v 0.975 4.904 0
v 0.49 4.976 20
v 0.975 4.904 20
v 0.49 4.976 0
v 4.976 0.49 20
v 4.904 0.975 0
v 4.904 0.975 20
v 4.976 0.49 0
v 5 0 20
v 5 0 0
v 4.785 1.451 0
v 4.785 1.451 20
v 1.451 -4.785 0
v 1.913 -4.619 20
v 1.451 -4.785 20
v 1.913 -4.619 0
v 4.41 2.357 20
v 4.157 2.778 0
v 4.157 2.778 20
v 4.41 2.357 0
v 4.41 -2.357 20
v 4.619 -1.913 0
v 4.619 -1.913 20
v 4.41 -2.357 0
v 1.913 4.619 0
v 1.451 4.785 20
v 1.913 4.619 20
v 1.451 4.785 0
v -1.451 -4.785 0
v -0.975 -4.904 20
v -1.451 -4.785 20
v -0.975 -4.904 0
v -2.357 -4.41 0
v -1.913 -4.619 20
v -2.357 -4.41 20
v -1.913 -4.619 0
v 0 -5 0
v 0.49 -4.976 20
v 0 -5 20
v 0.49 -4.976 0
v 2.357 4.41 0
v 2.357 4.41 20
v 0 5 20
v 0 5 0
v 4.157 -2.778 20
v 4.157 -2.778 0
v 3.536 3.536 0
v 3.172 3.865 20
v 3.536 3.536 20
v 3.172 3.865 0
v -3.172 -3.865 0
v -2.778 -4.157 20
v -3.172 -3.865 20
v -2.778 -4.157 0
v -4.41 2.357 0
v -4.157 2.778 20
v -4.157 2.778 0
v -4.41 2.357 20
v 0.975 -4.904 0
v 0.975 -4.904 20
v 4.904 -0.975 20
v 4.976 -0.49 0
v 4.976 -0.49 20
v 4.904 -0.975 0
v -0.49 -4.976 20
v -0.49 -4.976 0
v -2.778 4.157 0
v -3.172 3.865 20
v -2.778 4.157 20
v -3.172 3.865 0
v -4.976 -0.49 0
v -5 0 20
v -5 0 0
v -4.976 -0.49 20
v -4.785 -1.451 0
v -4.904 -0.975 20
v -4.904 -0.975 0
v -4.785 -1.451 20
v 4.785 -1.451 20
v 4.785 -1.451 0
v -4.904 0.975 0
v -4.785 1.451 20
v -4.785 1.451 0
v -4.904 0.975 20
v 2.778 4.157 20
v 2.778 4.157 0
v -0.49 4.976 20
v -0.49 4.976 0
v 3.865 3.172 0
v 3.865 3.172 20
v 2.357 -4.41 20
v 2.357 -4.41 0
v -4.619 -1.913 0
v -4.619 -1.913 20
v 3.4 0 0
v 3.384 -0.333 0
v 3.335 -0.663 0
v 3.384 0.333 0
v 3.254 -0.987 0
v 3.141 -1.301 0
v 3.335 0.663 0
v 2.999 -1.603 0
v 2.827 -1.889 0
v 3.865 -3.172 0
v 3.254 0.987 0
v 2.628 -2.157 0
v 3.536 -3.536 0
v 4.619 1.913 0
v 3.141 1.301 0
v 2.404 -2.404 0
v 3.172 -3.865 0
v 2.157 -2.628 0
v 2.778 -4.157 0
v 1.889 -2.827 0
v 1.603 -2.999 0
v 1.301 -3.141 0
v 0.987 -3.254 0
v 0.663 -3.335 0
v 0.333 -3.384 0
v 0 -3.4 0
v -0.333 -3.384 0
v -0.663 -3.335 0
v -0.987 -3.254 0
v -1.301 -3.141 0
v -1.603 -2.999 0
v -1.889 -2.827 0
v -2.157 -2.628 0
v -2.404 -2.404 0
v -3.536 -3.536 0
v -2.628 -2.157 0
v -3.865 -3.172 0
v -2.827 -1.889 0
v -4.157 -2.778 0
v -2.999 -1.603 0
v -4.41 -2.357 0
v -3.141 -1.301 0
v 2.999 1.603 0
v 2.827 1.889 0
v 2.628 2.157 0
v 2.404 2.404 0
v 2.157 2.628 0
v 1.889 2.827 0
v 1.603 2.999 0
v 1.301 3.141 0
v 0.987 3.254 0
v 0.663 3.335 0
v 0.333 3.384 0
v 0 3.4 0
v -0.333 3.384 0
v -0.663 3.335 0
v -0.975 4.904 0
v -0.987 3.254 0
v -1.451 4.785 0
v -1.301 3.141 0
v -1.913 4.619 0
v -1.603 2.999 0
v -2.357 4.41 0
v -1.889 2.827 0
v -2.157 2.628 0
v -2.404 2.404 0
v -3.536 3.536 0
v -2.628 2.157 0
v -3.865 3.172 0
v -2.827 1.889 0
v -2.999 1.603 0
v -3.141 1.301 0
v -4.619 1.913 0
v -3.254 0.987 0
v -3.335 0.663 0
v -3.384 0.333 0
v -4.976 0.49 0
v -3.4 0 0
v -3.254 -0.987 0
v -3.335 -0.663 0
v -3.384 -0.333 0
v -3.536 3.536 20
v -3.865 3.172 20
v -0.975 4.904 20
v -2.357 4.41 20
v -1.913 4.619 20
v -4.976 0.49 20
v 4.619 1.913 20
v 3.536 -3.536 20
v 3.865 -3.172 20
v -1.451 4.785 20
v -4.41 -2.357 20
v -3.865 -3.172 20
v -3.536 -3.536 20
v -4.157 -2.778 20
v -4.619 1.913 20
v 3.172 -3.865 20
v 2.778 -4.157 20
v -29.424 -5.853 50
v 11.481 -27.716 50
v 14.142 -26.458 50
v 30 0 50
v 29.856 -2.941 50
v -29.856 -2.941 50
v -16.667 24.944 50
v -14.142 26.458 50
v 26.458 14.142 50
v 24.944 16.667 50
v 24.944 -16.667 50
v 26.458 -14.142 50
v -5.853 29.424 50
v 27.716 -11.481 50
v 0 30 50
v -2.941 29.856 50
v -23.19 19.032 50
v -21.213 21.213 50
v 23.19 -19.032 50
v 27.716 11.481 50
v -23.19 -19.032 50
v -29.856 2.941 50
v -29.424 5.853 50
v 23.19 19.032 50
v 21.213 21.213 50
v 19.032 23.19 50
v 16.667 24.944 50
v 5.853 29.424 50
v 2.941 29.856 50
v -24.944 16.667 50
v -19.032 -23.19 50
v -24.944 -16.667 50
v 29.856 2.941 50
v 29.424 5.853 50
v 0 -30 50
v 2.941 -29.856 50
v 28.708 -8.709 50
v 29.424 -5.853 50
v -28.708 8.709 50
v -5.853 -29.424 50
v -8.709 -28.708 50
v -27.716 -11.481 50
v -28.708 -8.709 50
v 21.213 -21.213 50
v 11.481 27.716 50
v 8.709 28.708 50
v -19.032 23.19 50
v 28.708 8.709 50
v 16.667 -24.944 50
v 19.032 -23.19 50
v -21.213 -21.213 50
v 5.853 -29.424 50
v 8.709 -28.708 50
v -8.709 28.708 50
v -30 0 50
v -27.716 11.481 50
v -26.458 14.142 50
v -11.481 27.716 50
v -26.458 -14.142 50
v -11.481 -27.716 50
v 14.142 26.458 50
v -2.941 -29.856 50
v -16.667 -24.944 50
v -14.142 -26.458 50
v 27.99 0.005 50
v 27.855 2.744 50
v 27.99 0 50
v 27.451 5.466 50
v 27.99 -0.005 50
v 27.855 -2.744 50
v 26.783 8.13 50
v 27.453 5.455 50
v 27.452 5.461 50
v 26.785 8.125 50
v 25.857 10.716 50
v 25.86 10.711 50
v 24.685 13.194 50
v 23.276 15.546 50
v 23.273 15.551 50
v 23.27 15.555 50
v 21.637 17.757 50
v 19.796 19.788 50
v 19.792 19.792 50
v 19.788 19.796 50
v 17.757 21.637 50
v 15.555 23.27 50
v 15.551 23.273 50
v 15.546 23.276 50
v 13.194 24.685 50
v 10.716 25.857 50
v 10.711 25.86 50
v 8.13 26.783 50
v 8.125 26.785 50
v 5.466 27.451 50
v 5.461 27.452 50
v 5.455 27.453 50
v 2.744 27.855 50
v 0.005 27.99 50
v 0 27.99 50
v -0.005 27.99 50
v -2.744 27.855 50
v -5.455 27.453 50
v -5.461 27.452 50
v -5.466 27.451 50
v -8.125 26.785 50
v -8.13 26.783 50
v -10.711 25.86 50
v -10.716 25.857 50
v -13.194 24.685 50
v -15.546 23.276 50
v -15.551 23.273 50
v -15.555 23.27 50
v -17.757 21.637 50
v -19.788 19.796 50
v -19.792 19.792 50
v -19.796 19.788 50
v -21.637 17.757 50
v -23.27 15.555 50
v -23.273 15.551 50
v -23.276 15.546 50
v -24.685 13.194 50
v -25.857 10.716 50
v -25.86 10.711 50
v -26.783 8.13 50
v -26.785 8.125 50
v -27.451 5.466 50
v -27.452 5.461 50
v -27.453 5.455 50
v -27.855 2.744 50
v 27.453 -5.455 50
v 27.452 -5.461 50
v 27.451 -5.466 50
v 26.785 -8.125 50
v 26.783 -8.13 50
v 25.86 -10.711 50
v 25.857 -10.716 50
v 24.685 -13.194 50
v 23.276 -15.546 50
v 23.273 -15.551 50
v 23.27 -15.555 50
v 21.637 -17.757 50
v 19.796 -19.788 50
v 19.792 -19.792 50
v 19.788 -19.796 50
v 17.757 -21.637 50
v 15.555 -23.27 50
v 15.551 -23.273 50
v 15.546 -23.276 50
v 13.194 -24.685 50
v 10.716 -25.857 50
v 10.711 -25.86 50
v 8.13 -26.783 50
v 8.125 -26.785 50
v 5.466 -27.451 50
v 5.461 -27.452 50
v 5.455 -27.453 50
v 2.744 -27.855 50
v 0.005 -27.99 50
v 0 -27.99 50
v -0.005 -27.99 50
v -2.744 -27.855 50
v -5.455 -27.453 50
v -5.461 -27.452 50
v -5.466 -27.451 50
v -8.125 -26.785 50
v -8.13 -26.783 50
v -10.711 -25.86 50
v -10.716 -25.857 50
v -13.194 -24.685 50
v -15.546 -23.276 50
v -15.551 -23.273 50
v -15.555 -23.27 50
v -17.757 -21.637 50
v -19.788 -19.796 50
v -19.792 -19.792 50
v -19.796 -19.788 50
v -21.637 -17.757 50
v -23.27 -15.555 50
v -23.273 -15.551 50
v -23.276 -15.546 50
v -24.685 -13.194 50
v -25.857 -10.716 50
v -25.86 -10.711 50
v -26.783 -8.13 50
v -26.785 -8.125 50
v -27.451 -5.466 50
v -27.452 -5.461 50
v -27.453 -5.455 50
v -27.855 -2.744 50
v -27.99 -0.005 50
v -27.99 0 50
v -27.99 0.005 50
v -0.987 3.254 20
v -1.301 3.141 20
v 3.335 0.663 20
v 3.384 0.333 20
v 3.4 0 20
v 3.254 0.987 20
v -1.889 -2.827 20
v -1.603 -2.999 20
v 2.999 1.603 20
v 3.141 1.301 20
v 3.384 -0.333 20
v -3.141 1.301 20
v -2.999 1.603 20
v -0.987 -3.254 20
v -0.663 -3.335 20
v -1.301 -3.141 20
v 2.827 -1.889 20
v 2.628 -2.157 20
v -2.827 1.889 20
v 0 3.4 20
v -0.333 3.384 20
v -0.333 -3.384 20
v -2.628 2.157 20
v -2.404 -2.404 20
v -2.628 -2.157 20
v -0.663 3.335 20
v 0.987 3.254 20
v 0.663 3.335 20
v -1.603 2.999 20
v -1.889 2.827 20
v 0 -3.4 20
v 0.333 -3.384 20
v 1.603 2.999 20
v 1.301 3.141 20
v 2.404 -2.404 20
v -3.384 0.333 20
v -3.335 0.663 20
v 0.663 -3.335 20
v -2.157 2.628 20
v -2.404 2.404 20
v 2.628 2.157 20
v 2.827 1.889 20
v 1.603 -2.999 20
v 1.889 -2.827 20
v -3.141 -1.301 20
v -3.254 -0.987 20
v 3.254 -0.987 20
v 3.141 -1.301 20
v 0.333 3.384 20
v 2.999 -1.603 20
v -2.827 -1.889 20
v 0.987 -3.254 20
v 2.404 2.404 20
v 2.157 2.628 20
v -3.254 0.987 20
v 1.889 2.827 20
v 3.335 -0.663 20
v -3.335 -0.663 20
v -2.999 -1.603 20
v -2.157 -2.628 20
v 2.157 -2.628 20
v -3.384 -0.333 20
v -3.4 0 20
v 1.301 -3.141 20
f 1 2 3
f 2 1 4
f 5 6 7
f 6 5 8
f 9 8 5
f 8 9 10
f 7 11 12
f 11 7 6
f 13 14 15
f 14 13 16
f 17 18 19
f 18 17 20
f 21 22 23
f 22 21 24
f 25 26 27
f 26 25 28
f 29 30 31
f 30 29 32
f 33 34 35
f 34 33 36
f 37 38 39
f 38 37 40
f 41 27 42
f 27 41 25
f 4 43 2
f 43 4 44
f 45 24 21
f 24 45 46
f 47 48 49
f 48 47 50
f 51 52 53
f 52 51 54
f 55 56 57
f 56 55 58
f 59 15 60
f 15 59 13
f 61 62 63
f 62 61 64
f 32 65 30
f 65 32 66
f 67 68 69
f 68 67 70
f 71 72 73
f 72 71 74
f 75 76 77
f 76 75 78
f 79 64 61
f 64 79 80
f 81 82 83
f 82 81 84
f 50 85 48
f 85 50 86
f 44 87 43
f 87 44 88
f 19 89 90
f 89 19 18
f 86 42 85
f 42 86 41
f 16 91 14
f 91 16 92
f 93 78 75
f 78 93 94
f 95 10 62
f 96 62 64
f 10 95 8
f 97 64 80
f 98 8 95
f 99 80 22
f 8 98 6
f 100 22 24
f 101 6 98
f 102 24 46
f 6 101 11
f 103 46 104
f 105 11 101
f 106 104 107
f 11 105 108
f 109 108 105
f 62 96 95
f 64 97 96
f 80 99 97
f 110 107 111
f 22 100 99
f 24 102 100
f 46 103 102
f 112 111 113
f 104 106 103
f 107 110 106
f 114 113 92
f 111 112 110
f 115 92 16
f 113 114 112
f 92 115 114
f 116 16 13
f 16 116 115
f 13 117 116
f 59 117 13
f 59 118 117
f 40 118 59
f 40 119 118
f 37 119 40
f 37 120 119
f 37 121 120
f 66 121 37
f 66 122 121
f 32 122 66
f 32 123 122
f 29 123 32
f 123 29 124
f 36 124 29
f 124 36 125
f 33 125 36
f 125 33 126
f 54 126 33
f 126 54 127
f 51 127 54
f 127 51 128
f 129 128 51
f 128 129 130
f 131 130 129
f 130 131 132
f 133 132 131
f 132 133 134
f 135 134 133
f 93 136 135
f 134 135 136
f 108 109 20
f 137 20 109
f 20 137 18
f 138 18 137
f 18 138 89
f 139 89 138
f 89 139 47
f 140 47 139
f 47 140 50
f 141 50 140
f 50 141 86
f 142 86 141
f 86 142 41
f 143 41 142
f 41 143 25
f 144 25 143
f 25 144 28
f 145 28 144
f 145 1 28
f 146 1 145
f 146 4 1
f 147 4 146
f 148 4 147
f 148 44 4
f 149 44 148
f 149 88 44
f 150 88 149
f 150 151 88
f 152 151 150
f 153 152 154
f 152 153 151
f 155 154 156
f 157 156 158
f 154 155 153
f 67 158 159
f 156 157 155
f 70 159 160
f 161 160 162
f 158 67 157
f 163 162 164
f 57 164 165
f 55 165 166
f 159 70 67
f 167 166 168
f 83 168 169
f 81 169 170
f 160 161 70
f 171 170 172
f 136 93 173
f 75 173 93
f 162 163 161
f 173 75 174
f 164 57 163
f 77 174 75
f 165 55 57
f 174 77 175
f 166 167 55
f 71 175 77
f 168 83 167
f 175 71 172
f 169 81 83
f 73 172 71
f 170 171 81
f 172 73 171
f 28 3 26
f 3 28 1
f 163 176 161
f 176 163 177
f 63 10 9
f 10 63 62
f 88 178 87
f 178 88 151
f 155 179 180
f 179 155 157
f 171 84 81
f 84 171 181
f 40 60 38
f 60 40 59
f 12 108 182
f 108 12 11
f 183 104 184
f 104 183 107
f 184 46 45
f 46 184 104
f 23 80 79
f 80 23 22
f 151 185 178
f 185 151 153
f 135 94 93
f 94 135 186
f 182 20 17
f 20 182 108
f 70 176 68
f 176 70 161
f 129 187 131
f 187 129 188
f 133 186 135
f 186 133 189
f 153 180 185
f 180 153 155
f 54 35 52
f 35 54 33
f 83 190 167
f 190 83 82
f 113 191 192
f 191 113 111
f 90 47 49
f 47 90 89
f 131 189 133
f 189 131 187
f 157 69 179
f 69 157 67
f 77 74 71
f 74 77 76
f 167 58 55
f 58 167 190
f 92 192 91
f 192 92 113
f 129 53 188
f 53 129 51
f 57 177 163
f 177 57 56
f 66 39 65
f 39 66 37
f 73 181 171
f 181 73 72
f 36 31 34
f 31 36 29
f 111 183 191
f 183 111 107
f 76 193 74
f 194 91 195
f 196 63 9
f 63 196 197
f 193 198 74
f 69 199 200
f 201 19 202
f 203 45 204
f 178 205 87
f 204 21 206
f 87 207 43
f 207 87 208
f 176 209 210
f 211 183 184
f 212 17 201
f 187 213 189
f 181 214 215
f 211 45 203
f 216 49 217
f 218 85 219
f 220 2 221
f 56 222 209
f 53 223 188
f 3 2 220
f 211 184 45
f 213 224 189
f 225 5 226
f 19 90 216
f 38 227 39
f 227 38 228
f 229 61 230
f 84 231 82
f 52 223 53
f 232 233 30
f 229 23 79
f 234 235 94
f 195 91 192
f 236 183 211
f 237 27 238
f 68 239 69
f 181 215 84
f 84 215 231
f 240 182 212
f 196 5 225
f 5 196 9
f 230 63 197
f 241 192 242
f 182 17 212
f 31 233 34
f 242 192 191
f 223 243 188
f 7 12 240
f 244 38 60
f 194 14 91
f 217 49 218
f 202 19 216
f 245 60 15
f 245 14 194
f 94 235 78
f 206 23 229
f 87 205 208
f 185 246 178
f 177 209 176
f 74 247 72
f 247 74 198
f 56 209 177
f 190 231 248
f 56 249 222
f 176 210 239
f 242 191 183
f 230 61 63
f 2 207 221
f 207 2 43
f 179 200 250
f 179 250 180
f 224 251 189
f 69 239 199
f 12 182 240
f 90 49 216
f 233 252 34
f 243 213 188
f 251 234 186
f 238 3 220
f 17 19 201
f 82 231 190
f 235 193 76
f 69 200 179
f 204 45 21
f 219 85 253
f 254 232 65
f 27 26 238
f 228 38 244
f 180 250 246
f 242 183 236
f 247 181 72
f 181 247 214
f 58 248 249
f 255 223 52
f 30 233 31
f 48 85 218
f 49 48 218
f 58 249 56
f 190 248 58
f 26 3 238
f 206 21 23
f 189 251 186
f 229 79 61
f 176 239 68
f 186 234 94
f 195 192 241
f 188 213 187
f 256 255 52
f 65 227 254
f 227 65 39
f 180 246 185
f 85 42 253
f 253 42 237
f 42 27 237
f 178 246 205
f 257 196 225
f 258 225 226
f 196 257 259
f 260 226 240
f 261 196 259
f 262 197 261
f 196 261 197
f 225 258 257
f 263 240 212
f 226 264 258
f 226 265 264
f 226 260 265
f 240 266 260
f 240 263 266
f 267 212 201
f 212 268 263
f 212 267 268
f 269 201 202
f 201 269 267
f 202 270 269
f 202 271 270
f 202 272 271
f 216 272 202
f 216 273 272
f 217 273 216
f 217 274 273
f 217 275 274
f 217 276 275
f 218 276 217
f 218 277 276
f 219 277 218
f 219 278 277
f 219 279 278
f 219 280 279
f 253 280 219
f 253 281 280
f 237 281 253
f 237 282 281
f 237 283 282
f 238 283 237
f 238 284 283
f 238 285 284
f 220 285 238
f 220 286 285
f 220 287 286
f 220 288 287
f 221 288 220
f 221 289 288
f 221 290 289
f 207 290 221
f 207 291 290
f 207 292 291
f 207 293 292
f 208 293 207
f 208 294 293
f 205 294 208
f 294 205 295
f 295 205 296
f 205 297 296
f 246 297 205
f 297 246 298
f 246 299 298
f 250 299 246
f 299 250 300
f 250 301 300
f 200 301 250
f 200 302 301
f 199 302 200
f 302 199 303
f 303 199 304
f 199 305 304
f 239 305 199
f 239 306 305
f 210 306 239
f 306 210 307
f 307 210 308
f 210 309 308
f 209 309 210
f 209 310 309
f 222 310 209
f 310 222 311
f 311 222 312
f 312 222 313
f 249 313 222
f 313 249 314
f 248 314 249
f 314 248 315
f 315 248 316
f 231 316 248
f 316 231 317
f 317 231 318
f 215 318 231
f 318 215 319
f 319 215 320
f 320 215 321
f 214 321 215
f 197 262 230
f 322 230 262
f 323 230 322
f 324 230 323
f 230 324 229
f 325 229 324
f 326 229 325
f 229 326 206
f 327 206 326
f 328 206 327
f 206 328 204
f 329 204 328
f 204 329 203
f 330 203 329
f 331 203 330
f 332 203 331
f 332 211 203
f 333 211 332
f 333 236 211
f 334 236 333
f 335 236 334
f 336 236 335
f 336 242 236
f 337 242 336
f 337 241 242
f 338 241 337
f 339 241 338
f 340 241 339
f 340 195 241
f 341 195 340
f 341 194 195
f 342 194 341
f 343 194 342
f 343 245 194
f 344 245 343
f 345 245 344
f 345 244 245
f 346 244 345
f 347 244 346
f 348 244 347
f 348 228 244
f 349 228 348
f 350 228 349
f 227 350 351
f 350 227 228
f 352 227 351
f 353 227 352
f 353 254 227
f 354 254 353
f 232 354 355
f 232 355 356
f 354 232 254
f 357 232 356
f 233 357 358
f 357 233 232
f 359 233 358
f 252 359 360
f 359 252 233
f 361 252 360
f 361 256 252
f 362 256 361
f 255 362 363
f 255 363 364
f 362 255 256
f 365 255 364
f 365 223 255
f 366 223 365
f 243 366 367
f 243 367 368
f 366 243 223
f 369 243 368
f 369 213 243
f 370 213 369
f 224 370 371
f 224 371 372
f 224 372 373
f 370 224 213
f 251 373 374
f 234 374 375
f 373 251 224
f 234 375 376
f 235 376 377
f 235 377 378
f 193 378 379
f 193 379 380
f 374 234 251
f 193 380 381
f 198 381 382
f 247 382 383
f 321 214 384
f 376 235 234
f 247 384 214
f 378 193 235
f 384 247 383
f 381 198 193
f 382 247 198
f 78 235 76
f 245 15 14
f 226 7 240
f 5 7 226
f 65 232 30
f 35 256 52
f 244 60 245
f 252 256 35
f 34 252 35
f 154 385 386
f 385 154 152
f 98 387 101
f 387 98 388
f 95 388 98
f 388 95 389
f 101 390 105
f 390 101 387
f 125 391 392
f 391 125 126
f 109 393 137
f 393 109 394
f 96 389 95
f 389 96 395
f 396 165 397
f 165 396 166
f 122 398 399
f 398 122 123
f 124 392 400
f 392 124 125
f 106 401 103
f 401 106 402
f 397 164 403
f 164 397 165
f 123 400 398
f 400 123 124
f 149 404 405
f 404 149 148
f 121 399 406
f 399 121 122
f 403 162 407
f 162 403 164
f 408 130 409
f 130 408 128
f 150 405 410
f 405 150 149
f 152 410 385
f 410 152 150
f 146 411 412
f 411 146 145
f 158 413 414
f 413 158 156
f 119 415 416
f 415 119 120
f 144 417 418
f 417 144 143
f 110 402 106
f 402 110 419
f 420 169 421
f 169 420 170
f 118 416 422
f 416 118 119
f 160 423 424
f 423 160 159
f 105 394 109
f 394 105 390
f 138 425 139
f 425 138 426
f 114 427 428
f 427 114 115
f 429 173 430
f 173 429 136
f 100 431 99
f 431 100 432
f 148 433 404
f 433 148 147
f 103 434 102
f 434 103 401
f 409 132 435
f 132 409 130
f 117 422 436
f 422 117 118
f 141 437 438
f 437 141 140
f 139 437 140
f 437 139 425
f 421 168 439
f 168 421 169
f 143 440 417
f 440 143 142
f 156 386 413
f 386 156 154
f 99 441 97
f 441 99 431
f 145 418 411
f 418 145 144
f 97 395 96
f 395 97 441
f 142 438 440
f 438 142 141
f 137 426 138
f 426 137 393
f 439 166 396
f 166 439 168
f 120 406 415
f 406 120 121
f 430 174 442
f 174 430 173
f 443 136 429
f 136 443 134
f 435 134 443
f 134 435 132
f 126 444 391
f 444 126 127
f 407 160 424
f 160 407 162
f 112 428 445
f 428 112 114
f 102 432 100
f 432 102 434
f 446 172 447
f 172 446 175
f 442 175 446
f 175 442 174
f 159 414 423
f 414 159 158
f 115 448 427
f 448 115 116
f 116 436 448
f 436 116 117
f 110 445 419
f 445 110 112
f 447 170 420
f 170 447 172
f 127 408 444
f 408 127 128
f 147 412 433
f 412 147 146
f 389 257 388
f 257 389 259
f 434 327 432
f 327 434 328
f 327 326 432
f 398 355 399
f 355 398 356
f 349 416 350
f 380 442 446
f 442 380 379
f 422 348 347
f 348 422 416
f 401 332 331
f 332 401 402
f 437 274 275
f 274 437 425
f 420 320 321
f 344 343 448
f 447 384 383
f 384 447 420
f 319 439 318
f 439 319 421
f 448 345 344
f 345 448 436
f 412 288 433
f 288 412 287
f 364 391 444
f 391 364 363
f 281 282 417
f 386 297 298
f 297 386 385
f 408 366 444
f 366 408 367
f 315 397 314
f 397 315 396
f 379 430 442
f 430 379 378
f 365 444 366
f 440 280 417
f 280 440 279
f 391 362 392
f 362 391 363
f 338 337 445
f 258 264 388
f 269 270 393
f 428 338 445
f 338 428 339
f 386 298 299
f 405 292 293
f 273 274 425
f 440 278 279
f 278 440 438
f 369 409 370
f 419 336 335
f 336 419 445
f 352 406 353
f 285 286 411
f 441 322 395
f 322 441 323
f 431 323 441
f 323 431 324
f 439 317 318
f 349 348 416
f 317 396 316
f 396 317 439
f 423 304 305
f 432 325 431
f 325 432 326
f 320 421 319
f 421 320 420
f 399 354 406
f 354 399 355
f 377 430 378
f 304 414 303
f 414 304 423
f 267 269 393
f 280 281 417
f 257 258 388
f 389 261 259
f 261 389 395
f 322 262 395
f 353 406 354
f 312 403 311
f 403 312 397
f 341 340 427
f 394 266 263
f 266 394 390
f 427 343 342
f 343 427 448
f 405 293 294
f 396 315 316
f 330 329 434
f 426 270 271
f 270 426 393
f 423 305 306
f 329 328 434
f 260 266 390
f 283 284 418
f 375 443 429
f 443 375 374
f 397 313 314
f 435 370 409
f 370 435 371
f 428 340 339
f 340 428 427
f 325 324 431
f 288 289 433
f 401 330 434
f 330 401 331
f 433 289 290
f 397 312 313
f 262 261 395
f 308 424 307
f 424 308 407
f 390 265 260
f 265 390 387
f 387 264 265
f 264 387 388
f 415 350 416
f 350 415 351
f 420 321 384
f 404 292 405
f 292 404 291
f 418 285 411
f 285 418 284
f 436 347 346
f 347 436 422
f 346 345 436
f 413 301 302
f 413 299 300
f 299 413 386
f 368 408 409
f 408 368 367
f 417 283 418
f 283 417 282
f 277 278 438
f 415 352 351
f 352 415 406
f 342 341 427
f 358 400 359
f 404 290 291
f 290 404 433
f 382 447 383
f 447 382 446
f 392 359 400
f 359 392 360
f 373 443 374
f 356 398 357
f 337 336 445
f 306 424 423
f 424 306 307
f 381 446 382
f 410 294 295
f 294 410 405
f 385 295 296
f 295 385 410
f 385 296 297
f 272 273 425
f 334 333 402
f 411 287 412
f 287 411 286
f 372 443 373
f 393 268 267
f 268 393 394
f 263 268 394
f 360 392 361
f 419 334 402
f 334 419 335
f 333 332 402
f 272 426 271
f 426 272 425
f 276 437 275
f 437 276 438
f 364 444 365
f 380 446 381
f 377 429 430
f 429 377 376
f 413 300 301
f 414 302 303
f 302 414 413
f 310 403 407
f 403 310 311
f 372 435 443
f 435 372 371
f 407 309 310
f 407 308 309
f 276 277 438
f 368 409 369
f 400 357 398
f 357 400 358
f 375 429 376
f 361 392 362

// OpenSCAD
// Lab Funnel Dimensions
// Spout outer diameter
spout_od = 10;
// Spout length (height from z=0 to z=20)
spout_h = 20;
// Rim outer diameter at top of cone
rim_od = 60;
// Total height of the funnel (z=0 to z=50)
total_h = 50;
// Wall thickness
wall_thick = 1.6;
// Fillet radius at the cone-spout junction to prevent sharp internal corners
fillet_r = 1.5;

// Derived dimensions
spout_r = spout_od / 2;
rim_r = rim_od / 2;
spout_id = spout_od - 2 * wall_thick;
spout_ir = spout_id / 2;

// Calculate the height of the conical section
// The cone starts at z = spout_h (20) and ends at z = total_h (50)
cone_h = total_h - spout_h;

// Calculate the inner cone geometry
// The inner surface follows the wall thickness.
// At the bottom of the cone (z=20), the inner radius is spout_ir.
// At the top of the cone (z=50), the inner radius is rim_r - wall_thick.
// Note: The prompt says "wall is 1.6 mm thick everywhere".
// This implies the radial distance between inner and outer surfaces is constant.
// Outer radius at z: R_out(z)
// Inner radius at z: R_in(z) = R_out(z) - wall_thick

// Let's verify the geometry.
// z=0 to z=20: Cylinder. Outer R = 5. Inner R = 5 - 1.6 = 3.4.
// z=20 to z=50: Cone.
// Outer R at z=20 is 5. Outer R at z=50 is 30.
// Inner R at z=20 is 3.4. Inner R at z=50 is 30 - 1.6 = 28.4.

// To model this cleanly, we can use a difference operation.
// 1. Create the outer solid.
// 2. Create the inner void solid.
// 3. Subtract inner from outer.

// Outer Solid:
// Part 1: Spout cylinder (z=0 to z=20)
// Part 2: Cone (z=20 to z=50)

// Inner Solid (Void):
// Part 1: Spout bore cylinder (z=0 to z=20)
// Part 2: Inner cone (z=20 to z=50)

// We need to ensure the inner void extends slightly past the faces for clean boolean operations.
// The prompt asks for open top and bottom.

// Helper function to create the outer shape
module outer_shape() {
    union() {
        // Spout cylinder
        cylinder(r = spout_r, h = spout_h, center = false);
        
        // Cone part
        // We build the cone from z=20 to z=50.
        // To make it a single solid with the cylinder, we can just define a cone
        // that sits on top of the cylinder.
        // However, standard cylinder/cone primitives are centered or bottom-aligned.
        // Let's build the cone separately and union it.
        // The cone's bottom face is at z=20, top at z=50.
        // Bottom radius = spout_r = 5
        // Top radius = rim_r = 30
        // Height = 30
        translate([0, 0, spout_h]) {
            // Create a cone. OpenSCAD cylinder with different top/bottom radii.
            // Note: The transition at z=20 is sharp in the outer geometry unless filleted.
            // The prompt doesn't specify an external fillet, just "wall is 1.6mm thick".
            // A sharp external corner is fine.
            cylinder(r1 = spout_r, r2 = rim_r, h = cone_h, center = false);
        }
    }
}

// Helper function to create the inner void shape
module inner_void() {
    union() {
        // Spout bore
        // Extends from z=0 to z=20.
        // To ensure the bottom hole is open, we extend it slightly below z=0.
        // To ensure it connects cleanly to the cone, we extend it slightly into the cone.
        cylinder(r = spout_ir, h = spout_h + 0.5, center = false);
        
        // Inner Cone
        // Starts at z=20.
        // Bottom radius (inner) = spout_ir = 3.4
        // Top radius (inner) = rim_r - wall_thick = 30 - 1.6 = 28.4
        // Height = 30
        // We extend it slightly upwards to ensure the top hole is open and clean.
        translate([0, 0, spout_h]) {
            cylinder(r1 = spout_ir, r2 = rim_r - wall_thick, h = cone_h + 0.5, center = false);
        }
    }
}

// Main Module
module lab_funnel() {
    $fn = 64;
    
    difference() {
        outer_shape();
        inner_void();
    }
}

lab_funnel();
